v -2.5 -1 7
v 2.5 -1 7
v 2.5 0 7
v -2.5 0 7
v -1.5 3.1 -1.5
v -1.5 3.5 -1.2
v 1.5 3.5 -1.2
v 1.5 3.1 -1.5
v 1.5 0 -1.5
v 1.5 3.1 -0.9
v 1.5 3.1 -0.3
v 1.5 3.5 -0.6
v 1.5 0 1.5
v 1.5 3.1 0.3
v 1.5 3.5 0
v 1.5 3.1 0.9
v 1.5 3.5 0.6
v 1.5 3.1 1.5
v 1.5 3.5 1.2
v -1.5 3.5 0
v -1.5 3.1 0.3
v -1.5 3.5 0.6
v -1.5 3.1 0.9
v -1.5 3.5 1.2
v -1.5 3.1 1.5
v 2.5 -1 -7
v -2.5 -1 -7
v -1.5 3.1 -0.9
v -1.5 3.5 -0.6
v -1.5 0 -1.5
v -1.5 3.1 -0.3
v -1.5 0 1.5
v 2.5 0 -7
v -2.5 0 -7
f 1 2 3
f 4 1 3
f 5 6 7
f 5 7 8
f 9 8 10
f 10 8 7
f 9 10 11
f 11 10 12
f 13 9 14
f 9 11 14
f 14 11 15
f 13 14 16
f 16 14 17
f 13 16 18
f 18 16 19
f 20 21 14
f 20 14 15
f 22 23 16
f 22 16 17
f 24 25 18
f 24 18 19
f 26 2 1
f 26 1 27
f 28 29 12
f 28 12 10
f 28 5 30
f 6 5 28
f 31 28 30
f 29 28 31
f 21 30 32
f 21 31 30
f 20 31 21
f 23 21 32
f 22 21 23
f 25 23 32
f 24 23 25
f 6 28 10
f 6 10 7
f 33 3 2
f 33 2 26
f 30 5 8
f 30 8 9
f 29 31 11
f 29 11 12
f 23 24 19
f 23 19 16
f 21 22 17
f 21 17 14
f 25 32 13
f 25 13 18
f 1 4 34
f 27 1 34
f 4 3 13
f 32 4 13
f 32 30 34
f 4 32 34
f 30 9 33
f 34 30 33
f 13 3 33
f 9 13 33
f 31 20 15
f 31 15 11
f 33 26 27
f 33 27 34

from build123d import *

# Parameters (mm, degrees)
BOSS_EXTRU_1_DEPTH      = 1.5
BOSS_EXTRU_1_DEPTH_BACK = 1.5
ESQUISSE2_W             = 14
ESQUISSE2_H             = 1
BOSS_EXTRU_2_DEPTH      = 1


with BuildPart() as part:
    # Esquisse1 → Boss.-Extru.1 (new, two sides: drawn at the far end of the back side and taken through both)
    with BuildSketch(Plane(origin=(0, 0, 0), x_dir=(0, 0, -1), z_dir=(1, 0, 0)).offset(-BOSS_EXTRU_1_DEPTH_BACK)):
        Polygon((-7, 0), (-1.5, 0), (-1.5, 3.1), (-1.2, 3.5), (-0.9, 3.1), (-0.6, 3.5), (-0.3, 3.1), (0, 3.5), (0.3, 3.1), (0.6, 3.5), (0.9, 3.1), (1.2, 3.5), (1.5, 3.1), (1.5, 0), (7, 0), (7, -1), (-7, -1), align=None)
    extrude(amount=BOSS_EXTRU_1_DEPTH + BOSS_EXTRU_1_DEPTH_BACK)

    # Esquisse2 → Boss.-Extru.2 (add)
    with BuildSketch(Plane(origin=(1.5, 0, 0), x_dir=(0, 0, -1), z_dir=(1, 0, 0))):
        with Locations((0, -0.5)):
            Rectangle(ESQUISSE2_W, ESQUISSE2_H)
    boss_extru_2 = extrude(amount=BOSS_EXTRU_2_DEPTH)

    # Symétrie1: Boss.-Extru.2 across plane
    add(boss_extru_2.mirror(Plane(origin=(0, 0, 0), x_dir=(0, 0, 1), z_dir=(1, 0, 0))))


solid = part.part
